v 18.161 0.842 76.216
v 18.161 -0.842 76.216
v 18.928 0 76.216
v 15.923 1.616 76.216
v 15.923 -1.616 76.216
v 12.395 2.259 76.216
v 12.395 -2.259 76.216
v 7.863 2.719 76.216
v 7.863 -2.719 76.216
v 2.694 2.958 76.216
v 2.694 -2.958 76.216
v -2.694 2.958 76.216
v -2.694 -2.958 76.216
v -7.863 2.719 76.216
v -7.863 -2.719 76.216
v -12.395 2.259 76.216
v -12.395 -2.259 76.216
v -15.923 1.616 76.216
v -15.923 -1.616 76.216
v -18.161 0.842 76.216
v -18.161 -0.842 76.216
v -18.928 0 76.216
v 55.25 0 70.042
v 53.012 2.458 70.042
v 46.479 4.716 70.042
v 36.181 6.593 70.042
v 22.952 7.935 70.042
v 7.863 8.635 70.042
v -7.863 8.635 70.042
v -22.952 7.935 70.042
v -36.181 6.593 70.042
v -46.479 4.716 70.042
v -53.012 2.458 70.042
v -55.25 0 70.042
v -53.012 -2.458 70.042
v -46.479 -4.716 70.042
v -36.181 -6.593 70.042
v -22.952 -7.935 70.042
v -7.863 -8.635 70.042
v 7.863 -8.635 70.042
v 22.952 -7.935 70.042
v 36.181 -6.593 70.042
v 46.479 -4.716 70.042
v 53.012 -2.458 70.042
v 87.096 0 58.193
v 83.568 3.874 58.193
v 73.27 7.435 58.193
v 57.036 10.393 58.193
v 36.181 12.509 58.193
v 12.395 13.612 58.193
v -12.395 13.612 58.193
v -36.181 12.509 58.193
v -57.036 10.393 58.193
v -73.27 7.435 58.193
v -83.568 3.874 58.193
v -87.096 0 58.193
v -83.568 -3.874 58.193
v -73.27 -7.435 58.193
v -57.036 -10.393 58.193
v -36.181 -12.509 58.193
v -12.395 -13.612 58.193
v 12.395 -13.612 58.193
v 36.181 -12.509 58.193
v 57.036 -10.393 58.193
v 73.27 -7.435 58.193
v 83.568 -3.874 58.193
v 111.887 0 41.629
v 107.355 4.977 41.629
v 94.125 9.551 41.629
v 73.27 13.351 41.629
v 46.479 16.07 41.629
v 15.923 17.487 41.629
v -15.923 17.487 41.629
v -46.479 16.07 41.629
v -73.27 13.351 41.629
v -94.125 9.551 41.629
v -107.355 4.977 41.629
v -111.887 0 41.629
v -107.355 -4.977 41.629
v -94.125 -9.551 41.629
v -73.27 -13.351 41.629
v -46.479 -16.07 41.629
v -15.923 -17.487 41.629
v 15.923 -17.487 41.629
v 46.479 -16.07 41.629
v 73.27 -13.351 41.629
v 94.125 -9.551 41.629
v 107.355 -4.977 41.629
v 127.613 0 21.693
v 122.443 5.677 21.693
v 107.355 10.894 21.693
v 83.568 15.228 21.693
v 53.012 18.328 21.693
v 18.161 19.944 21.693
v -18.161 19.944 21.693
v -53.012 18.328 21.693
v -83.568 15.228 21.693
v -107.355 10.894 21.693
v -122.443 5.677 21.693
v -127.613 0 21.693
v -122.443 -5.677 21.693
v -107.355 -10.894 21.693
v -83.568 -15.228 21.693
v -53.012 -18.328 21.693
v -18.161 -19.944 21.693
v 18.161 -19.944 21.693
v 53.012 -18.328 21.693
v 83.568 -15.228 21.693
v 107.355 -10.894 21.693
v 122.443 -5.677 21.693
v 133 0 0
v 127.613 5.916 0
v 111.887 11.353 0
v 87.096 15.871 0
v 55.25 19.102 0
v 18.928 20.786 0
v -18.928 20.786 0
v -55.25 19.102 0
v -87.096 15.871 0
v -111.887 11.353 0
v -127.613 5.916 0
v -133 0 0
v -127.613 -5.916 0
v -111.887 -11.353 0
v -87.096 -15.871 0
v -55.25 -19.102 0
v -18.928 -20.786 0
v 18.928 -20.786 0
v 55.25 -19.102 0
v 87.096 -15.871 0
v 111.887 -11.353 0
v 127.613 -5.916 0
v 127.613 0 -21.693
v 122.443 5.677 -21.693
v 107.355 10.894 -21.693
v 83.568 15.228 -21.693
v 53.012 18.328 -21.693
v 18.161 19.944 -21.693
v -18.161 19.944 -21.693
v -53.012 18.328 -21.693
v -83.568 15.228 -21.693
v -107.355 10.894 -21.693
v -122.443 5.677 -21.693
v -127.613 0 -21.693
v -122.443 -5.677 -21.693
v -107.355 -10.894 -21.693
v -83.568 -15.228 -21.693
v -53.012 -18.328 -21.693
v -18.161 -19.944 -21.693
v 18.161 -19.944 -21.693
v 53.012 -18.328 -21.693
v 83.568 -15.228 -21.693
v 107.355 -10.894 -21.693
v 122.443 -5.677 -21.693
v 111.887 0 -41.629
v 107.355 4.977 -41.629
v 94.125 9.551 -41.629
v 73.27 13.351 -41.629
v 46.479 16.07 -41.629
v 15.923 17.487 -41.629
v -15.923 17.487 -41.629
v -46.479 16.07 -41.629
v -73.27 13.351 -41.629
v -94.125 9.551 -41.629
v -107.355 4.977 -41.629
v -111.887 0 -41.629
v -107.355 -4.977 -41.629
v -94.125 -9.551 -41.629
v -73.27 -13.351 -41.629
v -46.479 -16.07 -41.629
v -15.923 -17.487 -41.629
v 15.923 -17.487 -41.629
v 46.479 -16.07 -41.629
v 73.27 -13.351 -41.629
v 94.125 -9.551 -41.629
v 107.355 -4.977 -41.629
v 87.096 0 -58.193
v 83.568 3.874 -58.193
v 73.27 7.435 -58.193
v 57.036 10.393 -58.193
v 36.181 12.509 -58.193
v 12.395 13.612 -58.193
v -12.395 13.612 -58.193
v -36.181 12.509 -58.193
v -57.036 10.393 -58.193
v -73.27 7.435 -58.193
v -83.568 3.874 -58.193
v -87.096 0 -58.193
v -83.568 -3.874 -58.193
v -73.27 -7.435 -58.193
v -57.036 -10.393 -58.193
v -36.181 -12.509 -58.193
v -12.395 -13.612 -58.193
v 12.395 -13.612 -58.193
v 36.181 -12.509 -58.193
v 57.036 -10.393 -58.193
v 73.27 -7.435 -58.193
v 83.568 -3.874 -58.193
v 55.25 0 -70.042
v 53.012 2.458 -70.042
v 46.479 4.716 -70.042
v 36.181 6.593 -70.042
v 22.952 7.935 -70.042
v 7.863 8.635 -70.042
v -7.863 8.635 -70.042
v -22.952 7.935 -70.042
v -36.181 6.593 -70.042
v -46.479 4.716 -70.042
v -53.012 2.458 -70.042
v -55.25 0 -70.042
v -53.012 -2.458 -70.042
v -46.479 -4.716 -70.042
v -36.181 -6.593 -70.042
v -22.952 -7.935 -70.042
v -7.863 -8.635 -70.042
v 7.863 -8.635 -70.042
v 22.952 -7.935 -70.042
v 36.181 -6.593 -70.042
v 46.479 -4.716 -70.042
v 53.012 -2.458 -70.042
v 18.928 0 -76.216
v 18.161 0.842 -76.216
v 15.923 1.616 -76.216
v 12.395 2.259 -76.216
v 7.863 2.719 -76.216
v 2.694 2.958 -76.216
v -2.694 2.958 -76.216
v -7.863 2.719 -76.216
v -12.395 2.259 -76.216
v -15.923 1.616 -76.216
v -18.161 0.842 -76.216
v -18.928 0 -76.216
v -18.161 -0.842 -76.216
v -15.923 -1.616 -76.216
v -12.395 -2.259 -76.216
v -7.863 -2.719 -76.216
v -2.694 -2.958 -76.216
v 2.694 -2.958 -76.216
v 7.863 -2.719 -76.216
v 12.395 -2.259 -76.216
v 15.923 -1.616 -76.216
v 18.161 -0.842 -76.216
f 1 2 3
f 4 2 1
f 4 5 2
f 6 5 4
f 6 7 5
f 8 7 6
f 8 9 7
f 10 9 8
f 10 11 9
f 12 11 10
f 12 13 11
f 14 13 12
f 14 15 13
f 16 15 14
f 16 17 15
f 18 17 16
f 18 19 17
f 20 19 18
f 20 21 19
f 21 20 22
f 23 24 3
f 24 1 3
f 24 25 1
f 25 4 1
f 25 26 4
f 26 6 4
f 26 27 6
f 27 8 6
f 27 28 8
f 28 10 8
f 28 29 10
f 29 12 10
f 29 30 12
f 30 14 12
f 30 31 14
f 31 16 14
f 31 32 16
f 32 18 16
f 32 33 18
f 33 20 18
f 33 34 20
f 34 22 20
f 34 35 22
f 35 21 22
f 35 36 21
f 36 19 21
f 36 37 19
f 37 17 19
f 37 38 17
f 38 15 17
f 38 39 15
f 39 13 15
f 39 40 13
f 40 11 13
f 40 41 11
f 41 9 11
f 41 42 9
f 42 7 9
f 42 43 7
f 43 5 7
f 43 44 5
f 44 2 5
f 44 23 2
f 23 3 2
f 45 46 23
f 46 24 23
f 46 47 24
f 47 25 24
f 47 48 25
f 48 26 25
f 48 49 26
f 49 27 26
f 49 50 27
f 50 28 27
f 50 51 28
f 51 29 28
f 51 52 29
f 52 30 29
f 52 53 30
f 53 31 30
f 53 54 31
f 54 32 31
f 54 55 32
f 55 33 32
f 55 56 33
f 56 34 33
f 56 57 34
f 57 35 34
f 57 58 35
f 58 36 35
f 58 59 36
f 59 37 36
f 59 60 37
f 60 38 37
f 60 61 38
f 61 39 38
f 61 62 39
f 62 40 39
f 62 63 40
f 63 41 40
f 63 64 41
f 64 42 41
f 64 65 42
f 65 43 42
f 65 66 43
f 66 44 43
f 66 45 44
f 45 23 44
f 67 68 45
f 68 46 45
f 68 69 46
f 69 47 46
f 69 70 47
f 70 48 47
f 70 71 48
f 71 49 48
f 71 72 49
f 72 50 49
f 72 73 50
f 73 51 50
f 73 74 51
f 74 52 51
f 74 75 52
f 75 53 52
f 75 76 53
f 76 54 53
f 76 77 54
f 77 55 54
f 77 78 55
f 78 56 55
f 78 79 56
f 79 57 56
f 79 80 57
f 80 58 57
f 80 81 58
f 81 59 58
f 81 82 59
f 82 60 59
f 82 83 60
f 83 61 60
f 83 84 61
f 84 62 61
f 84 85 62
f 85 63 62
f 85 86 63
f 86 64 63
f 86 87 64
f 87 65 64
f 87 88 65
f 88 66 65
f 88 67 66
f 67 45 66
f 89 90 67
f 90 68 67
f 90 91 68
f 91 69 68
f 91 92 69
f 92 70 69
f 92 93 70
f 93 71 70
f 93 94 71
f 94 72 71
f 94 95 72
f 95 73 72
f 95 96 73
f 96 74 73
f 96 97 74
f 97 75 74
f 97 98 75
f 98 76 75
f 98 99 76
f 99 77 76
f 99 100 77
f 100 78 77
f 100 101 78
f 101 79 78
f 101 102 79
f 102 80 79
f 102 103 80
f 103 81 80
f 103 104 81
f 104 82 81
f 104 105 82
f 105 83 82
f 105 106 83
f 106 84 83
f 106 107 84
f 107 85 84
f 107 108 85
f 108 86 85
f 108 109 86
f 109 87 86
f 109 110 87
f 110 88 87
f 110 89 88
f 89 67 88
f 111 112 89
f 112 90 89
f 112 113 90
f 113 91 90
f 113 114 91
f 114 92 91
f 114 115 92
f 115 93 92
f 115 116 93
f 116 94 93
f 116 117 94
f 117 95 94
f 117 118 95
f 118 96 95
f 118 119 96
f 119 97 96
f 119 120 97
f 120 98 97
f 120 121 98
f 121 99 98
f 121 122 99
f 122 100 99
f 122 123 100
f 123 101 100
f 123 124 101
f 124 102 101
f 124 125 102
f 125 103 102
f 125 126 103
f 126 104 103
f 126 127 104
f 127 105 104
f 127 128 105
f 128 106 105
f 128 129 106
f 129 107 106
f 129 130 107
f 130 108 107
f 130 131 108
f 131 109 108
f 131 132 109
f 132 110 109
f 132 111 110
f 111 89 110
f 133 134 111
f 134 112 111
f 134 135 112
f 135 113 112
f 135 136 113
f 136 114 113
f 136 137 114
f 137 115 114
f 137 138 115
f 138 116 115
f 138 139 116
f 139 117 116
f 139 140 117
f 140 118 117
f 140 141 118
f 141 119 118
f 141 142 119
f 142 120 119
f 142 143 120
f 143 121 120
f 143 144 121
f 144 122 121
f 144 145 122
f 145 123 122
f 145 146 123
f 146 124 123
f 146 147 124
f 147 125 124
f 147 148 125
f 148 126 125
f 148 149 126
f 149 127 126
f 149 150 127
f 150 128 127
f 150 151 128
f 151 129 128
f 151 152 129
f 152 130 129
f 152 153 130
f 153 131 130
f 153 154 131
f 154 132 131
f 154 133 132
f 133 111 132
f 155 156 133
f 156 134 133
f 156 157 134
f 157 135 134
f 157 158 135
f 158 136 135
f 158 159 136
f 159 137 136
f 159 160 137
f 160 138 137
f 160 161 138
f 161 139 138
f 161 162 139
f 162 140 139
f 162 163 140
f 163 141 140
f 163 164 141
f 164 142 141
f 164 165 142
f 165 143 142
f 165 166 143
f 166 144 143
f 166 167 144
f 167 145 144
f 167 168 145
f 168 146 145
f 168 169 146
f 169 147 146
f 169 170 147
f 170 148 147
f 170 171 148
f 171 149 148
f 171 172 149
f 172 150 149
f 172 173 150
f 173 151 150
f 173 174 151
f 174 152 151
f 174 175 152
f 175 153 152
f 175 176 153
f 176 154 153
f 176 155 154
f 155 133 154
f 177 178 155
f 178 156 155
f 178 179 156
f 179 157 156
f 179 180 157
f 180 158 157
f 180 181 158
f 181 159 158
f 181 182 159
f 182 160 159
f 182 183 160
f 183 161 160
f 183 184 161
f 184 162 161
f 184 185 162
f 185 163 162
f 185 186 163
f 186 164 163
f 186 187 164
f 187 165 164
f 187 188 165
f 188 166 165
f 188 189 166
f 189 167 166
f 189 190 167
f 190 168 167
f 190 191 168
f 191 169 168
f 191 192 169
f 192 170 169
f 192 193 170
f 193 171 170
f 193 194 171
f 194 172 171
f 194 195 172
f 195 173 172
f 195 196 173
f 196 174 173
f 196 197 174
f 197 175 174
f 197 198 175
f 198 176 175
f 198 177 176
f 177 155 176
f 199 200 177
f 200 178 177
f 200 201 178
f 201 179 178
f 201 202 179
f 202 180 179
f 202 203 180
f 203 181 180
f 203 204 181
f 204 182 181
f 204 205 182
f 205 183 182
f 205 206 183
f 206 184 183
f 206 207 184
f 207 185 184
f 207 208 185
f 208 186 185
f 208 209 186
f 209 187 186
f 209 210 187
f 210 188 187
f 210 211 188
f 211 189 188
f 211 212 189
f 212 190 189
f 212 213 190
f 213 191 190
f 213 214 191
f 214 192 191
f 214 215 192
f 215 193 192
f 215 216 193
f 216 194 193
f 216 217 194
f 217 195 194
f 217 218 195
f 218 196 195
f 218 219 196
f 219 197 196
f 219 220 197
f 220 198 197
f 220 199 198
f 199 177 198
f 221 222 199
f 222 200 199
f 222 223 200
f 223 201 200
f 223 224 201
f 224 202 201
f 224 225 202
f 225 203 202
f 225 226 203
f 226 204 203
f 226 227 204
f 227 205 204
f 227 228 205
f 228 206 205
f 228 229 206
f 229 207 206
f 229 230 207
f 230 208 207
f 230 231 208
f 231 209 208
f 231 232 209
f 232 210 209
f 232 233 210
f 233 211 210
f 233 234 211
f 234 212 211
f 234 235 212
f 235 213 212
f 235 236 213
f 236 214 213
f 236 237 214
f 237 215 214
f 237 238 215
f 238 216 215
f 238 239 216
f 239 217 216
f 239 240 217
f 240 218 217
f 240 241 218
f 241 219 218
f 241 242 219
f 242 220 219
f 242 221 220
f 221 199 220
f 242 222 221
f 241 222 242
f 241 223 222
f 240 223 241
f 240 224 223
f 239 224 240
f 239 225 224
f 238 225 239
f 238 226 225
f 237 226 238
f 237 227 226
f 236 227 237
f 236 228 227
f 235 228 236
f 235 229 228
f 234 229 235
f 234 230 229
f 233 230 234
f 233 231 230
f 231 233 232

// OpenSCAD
// Generated by SolidPython 1.0.1 on 2020-07-29 00:46:53


scale(v = [19, 3, 11]) {
	sphere(r = 7);
}
/***********************************************
*********      SolidPython code:      **********
************************************************
 
# import packages: SolidPython
from solid import *
from solid.utils import *
from itertools import chain, combinations, permutations


class Resize:

    def __init__(self, scad_file):
        self.scad_file = scad_file
        #self.scad_file = import_scad(scad_file)
        # cone/cylinder param:
        self.r1 = 0
        self.r2 = 0
        self.h = 0
        # rectangular prism param:
        self.w = 0
        self.l = 0
        # ellipse param:
        self.r = 0

    # import OpenScad code (file name corresponds to shape)


    # classify shape + parameters
    def assign(self, param1, param2, param3):
        if self.scad_file == 'cone.scad':
            self.r1 = param1
            self.r2 = param2
            self.h = param3
        elif self.scad_file == 'cylinder.scad':
            self.r1 = param1
            self.r2 = param2
            self.h = param3
        elif self.scad_file == 'rectangularPrism.scad':
            self.h = param1
            self.l = param2
            self.w = param3
        else:
            self.r = param1
            self.h = param2

    # resize parameters
    def iterate(self):
        x = range(3, 20, 2)
        i = 1
        if self.scad_file == 'cone.scad':
            tempList = list(permutations(x, 2))
            for temp in tempList:
                param1 = temp[0]
                param2 = temp[1]
                filepath = 'produced_scad_files/' + 'cone' + str(param1) + '_' + str(param2) + '_' + '.scad'
                scad_render_to_file(cylinder(h=param1, r1=param2, r2=0), filepath)

        elif self.scad_file == 'cylinder.scad':
            tempList = list(permutations(x, 3))
            for temp in tempList:
                param1 = temp[0]
                param2 = temp[1]
                filepath = 'produced_scad_files/' + 'cylinder' + str(param1) + '_' + str(param2) + '_' + '.scad'
                scad_render_to_file(cylinder(h=param1, r1=param2, r2=param2), filepath)

        elif self.scad_file == 'rectangularPrism.scad':
            tempList = list(permutations(x, 3))
            for temp in tempList:
                param1 = temp[0]
                param2 = temp[1]
                param3 = temp[2]
                filepath = 'produced_scad_files/' + 'rectangularPrism' + str(param1) + '_' + str(param2) + '_' + str(
                    param3) + '.scad'
                scad_render_to_file(cube(size=(param1, param2, param3)), filepath)

        elif self.scad_file == 'ellipse.scad':
            tempList = list(permutations(x, 4))
            for temp in tempList:
                param1 = temp[0]
                param2 = temp[1]
                param3 = temp[2]
                param4 = temp[3]
                filepath = 'produced_scad_files/' + 'ellipse' + str(param1) + '_' + str(param2) + '_' + str(param3) + '_' + str(param4) + '.scad'
                scad_render_to_file(scale([param1, param2, param3])(sphere(r=param4)), filepath)

    def render_to_scadfile(self):
        scad_render_to_file(scad, 'example.scad') 
 
************************************************/
